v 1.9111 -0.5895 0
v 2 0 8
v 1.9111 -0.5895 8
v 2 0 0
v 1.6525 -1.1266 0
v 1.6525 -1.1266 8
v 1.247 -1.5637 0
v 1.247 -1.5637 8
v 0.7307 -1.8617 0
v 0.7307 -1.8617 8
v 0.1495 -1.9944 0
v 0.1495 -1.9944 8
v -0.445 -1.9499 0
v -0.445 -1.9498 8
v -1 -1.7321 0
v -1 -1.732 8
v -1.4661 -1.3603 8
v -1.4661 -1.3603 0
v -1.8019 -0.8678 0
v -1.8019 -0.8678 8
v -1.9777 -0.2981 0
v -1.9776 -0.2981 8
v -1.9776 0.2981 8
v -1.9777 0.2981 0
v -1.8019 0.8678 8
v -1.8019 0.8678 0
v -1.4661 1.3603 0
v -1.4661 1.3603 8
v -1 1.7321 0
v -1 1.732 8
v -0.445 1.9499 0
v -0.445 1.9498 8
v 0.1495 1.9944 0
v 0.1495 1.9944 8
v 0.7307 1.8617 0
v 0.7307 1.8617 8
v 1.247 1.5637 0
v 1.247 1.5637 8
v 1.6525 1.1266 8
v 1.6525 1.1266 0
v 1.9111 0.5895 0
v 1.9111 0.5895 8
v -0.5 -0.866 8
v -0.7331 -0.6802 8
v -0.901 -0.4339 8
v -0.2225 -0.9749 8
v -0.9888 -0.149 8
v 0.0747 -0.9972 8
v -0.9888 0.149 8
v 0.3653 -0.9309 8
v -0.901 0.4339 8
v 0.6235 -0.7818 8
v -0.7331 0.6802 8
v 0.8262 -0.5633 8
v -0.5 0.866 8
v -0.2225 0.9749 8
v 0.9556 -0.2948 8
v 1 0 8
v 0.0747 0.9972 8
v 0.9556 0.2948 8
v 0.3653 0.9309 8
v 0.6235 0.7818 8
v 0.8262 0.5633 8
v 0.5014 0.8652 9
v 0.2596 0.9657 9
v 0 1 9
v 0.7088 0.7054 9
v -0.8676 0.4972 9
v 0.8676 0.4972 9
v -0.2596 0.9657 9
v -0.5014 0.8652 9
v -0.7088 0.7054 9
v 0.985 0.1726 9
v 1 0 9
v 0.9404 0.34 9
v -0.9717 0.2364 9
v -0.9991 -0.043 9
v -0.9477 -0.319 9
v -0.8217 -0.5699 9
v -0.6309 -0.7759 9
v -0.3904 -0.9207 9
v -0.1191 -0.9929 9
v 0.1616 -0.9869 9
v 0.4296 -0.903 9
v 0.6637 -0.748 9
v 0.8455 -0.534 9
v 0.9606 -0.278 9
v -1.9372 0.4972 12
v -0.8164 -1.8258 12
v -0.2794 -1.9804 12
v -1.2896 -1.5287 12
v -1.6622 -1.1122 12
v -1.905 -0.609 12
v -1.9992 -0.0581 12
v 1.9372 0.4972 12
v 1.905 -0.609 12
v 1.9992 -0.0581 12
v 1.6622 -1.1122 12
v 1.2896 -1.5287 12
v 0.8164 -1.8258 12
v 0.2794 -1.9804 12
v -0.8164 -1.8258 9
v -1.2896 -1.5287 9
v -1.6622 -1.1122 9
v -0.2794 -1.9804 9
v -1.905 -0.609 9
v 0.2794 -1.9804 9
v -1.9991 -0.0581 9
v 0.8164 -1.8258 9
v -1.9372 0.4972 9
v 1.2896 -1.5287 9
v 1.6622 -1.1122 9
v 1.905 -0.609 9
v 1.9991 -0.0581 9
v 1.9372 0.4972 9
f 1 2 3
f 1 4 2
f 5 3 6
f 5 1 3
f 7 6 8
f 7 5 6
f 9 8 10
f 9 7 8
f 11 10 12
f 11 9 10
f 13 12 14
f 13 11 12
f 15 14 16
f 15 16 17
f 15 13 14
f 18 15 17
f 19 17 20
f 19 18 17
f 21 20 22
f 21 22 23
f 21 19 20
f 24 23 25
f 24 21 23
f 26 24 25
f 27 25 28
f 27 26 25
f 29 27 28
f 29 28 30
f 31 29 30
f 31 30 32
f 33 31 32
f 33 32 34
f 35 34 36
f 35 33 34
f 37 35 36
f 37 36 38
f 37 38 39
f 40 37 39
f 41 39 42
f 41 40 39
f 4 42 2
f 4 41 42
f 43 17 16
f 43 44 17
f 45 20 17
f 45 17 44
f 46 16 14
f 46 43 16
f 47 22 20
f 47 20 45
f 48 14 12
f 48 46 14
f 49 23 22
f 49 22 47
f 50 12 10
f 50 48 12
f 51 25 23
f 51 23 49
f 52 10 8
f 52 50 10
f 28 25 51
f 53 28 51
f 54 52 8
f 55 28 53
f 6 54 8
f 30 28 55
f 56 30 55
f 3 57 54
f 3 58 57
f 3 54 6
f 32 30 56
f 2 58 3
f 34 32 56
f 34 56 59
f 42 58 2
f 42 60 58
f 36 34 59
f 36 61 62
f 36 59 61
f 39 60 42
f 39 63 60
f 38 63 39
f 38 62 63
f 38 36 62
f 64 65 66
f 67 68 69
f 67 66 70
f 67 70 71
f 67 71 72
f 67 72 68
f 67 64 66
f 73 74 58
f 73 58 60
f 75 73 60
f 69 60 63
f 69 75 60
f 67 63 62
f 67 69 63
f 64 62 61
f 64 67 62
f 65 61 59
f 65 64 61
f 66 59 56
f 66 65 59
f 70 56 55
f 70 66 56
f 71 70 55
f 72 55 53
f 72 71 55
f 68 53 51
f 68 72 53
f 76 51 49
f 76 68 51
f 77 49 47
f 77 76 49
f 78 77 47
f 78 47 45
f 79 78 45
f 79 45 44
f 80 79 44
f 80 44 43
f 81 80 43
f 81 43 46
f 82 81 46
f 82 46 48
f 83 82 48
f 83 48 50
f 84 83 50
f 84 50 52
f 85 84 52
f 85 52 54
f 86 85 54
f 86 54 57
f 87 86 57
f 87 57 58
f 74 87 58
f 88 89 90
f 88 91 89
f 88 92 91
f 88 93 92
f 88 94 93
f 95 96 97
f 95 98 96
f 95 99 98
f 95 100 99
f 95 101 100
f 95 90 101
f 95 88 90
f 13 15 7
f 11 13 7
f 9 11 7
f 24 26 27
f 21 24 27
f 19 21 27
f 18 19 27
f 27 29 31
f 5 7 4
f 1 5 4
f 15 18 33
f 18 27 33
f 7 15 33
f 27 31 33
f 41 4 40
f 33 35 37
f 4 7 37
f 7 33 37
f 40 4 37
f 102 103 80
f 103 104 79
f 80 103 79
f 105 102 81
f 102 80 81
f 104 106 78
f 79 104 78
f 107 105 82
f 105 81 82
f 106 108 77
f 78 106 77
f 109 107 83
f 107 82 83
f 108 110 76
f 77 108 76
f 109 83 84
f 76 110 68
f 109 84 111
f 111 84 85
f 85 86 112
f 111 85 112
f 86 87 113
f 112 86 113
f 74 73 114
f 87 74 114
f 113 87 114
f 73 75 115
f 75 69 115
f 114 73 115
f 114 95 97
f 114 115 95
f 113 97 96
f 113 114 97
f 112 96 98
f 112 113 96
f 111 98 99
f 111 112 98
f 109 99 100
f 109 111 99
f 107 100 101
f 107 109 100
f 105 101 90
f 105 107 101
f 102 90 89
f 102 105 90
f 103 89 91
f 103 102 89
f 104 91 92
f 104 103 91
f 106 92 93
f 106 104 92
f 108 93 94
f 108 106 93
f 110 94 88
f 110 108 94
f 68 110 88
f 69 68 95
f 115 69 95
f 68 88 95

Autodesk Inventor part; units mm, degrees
ref_plane "YZ Plane" through (0, 0, 0) normal (1, 0, 0) x (0, 1, 0)
ref_plane "XZ Plane" through (0, 0, 0) normal (0, 1, 0) x (-1, 0, 0)
sketch "Skizze1" plane through (0, 0, 0) normal (0, 0, 1) x (1, 0, 0)
  circle A0 centre (0, 0) radius 2
  dimension "d0" = 4
extrude "Extrusion1" add sketch "Skizze1" along normal blind 12
sketch "Skizze2" plane through (0, 0, 12) normal (0, 0, 1) x (1, 0, 0)
  circle A0 centre (0, 0) radius 2 projected
  line L0 (-1.9372, 0.4972) -> (1.9372, 0.4972)
extrude "Extrusion2" cut sketch "Skizze2" against normal blind 3 contours L0 A0 picked at (-0.0798, 0.9933)
ref_plane "Arbeitsebene1" through (0, 0, 9) normal (0, 0, 1) x (1, 0, 0)
sketch "Skizze3" plane through (0, 0, 9) normal (0, 0, 1) x (1, 0, 0)
  circle A0 centre (0, 0) radius 1
  arc A1 (1.9372, 0.4972) -> (-1.9372, 0.4972) centre (0, 0) ccw projected
  arc A2 (-1.9372, 0.4972) -> (1.9372, 0.4972) centre (0, 0) ccw projected
  dimension "d6" = 2
extrude "Extrusion3" cut sketch "Skizze3" against normal blind 1
properties part number "motor" material "Aluminium 6061"
